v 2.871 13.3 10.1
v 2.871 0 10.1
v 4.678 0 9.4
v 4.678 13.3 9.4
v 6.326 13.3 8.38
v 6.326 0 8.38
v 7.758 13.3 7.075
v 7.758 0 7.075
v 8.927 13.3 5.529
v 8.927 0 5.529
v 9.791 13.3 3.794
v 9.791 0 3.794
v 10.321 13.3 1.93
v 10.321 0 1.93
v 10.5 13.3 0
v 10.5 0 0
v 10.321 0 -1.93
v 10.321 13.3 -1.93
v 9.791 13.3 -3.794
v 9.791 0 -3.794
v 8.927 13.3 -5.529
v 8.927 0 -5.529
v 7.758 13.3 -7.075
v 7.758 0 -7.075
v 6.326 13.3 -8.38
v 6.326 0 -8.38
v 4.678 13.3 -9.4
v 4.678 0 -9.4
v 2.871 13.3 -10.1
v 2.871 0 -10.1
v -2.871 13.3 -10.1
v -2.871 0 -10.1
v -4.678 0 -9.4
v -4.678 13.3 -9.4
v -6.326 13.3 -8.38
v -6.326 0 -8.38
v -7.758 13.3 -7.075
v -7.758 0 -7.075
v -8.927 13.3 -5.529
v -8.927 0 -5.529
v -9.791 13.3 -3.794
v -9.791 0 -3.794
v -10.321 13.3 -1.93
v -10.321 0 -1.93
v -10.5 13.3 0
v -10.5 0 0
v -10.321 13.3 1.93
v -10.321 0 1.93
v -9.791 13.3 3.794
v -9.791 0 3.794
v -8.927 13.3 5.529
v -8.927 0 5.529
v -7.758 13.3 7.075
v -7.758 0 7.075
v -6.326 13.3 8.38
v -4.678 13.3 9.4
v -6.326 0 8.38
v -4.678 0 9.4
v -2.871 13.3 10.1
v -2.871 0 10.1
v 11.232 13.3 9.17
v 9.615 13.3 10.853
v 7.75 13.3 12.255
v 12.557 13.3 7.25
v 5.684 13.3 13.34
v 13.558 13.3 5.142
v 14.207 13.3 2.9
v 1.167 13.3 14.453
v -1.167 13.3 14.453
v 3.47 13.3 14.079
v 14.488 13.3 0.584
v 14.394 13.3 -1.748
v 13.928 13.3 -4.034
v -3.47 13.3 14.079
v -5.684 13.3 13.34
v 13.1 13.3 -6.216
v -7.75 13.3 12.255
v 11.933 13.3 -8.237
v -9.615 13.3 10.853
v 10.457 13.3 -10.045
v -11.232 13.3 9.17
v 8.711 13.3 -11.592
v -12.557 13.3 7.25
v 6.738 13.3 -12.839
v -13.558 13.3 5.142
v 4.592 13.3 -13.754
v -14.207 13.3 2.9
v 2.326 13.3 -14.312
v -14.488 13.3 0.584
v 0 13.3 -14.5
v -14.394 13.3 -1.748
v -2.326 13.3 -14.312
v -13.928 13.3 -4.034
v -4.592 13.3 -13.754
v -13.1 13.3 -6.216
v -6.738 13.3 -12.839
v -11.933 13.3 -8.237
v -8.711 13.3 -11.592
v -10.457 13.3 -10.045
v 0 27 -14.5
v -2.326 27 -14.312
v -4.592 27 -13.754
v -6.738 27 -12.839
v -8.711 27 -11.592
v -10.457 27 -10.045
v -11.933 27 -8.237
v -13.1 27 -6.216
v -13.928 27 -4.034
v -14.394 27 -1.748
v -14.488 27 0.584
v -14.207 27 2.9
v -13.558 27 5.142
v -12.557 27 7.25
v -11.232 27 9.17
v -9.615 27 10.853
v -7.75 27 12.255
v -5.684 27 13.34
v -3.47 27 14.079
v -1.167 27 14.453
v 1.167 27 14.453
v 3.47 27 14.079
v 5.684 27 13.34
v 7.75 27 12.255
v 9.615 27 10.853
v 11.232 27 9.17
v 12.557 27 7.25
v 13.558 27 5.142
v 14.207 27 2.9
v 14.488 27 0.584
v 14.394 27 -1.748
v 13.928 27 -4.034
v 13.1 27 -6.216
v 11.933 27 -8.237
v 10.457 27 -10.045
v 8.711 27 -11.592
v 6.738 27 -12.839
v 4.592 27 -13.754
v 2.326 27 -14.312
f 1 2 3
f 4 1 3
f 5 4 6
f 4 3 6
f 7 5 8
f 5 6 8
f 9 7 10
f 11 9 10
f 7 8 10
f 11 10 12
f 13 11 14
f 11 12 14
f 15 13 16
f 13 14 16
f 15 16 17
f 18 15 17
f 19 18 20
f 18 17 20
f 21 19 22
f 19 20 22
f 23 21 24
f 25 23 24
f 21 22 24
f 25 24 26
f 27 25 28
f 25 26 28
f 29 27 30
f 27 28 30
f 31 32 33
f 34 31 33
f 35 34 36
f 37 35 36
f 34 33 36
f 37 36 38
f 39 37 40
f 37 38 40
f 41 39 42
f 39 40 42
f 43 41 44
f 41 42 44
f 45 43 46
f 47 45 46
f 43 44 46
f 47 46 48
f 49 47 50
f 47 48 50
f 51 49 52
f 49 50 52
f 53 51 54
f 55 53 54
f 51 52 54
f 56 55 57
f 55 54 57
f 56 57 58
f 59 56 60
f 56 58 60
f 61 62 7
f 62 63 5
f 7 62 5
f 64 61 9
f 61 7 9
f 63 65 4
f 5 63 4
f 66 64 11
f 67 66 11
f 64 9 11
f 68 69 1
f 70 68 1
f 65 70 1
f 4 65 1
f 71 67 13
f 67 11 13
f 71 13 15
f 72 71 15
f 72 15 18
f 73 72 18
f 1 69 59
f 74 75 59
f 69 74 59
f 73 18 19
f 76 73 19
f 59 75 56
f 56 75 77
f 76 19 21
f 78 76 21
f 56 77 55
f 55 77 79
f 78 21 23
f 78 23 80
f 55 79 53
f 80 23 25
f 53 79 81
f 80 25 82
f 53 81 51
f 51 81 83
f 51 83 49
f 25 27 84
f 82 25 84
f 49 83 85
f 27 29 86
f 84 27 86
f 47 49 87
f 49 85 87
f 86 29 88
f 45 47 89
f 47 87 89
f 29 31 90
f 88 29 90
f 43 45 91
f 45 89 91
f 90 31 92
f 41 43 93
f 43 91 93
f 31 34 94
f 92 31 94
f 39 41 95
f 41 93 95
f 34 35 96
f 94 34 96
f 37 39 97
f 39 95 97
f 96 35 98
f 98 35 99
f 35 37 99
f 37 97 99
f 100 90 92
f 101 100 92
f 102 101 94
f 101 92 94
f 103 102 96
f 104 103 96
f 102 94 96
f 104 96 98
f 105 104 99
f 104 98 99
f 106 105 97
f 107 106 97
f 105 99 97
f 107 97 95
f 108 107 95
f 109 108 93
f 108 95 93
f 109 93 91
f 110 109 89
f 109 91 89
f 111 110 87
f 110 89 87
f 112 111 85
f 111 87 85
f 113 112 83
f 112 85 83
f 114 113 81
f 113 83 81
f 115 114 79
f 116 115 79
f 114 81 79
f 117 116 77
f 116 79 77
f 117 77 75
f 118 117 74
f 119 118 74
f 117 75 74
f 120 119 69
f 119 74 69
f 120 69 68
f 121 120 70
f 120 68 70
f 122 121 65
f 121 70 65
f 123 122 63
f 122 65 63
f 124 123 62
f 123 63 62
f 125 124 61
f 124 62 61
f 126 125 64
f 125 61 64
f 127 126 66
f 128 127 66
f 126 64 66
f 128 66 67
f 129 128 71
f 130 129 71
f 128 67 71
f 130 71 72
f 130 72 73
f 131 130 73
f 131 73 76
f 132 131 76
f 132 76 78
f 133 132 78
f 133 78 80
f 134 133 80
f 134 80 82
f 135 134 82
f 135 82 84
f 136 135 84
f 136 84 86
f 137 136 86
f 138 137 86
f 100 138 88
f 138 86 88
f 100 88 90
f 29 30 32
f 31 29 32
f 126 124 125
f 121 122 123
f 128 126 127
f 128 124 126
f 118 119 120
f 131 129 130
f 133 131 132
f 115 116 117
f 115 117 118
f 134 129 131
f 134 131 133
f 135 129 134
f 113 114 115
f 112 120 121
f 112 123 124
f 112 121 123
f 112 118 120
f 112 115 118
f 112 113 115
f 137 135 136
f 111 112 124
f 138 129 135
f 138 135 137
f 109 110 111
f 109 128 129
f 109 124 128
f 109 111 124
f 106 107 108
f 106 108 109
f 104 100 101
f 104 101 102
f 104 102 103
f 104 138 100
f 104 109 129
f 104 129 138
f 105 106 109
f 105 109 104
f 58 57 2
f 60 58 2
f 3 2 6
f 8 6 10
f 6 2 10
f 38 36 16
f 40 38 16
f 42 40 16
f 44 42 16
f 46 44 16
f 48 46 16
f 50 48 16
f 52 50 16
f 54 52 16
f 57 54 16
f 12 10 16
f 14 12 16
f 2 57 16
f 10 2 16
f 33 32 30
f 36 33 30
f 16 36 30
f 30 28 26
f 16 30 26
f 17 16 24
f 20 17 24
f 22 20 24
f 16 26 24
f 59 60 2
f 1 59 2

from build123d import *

# Parameters (mm, degrees)
BOSS_EXTRUDE1_DEPTH = 13.3
SKETCH2_R           = 14.5
BOSS_EXTRUDE2_DEPTH = 13.7


with BuildPart() as part:
    # Sketch1 → Boss-Extrude1 (new body)
    with BuildSketch(Plane(origin=(0, 0, 0), x_dir=(1, 0, 0), z_dir=(0, 1, 0))):
        with BuildLine():
            Line((2.870540019, 10.1), (-2.870540019, 10.1))
            ThreePointArc((-2.870540019, 10.1), (-10.5, 0), (-2.870540019, -10.1))
            Line((-2.870540019, -10.1), (2.870540019, -10.1))
            Line((2.870540019, -10.1), (2.870540019, 10.1))
        make_face()
        with BuildLine():
            ThreePointArc((10.5, 0), (8.378265638, 6.328875485), (2.870540019, 10.1))
            Line((2.870540019, 10.1), (2.870540019, -10.1))
            ThreePointArc((2.870540019, -10.1), (8.378265638, -6.328875485), (10.5, 0))
        make_face()
    extrude(amount=BOSS_EXTRUDE1_DEPTH)

    # Sketch2 → Boss-Extrude2 (add)
    with BuildSketch(Plane(origin=(0, 13.3, 0), x_dir=(1, 0, 0), z_dir=(0, 1, 0))):
        with Locations(Location((0, 0, 0), (0, 0, 90))):
            Circle(SKETCH2_R)
    extrude(amount=BOSS_EXTRUDE2_DEPTH)


solid = part.part
